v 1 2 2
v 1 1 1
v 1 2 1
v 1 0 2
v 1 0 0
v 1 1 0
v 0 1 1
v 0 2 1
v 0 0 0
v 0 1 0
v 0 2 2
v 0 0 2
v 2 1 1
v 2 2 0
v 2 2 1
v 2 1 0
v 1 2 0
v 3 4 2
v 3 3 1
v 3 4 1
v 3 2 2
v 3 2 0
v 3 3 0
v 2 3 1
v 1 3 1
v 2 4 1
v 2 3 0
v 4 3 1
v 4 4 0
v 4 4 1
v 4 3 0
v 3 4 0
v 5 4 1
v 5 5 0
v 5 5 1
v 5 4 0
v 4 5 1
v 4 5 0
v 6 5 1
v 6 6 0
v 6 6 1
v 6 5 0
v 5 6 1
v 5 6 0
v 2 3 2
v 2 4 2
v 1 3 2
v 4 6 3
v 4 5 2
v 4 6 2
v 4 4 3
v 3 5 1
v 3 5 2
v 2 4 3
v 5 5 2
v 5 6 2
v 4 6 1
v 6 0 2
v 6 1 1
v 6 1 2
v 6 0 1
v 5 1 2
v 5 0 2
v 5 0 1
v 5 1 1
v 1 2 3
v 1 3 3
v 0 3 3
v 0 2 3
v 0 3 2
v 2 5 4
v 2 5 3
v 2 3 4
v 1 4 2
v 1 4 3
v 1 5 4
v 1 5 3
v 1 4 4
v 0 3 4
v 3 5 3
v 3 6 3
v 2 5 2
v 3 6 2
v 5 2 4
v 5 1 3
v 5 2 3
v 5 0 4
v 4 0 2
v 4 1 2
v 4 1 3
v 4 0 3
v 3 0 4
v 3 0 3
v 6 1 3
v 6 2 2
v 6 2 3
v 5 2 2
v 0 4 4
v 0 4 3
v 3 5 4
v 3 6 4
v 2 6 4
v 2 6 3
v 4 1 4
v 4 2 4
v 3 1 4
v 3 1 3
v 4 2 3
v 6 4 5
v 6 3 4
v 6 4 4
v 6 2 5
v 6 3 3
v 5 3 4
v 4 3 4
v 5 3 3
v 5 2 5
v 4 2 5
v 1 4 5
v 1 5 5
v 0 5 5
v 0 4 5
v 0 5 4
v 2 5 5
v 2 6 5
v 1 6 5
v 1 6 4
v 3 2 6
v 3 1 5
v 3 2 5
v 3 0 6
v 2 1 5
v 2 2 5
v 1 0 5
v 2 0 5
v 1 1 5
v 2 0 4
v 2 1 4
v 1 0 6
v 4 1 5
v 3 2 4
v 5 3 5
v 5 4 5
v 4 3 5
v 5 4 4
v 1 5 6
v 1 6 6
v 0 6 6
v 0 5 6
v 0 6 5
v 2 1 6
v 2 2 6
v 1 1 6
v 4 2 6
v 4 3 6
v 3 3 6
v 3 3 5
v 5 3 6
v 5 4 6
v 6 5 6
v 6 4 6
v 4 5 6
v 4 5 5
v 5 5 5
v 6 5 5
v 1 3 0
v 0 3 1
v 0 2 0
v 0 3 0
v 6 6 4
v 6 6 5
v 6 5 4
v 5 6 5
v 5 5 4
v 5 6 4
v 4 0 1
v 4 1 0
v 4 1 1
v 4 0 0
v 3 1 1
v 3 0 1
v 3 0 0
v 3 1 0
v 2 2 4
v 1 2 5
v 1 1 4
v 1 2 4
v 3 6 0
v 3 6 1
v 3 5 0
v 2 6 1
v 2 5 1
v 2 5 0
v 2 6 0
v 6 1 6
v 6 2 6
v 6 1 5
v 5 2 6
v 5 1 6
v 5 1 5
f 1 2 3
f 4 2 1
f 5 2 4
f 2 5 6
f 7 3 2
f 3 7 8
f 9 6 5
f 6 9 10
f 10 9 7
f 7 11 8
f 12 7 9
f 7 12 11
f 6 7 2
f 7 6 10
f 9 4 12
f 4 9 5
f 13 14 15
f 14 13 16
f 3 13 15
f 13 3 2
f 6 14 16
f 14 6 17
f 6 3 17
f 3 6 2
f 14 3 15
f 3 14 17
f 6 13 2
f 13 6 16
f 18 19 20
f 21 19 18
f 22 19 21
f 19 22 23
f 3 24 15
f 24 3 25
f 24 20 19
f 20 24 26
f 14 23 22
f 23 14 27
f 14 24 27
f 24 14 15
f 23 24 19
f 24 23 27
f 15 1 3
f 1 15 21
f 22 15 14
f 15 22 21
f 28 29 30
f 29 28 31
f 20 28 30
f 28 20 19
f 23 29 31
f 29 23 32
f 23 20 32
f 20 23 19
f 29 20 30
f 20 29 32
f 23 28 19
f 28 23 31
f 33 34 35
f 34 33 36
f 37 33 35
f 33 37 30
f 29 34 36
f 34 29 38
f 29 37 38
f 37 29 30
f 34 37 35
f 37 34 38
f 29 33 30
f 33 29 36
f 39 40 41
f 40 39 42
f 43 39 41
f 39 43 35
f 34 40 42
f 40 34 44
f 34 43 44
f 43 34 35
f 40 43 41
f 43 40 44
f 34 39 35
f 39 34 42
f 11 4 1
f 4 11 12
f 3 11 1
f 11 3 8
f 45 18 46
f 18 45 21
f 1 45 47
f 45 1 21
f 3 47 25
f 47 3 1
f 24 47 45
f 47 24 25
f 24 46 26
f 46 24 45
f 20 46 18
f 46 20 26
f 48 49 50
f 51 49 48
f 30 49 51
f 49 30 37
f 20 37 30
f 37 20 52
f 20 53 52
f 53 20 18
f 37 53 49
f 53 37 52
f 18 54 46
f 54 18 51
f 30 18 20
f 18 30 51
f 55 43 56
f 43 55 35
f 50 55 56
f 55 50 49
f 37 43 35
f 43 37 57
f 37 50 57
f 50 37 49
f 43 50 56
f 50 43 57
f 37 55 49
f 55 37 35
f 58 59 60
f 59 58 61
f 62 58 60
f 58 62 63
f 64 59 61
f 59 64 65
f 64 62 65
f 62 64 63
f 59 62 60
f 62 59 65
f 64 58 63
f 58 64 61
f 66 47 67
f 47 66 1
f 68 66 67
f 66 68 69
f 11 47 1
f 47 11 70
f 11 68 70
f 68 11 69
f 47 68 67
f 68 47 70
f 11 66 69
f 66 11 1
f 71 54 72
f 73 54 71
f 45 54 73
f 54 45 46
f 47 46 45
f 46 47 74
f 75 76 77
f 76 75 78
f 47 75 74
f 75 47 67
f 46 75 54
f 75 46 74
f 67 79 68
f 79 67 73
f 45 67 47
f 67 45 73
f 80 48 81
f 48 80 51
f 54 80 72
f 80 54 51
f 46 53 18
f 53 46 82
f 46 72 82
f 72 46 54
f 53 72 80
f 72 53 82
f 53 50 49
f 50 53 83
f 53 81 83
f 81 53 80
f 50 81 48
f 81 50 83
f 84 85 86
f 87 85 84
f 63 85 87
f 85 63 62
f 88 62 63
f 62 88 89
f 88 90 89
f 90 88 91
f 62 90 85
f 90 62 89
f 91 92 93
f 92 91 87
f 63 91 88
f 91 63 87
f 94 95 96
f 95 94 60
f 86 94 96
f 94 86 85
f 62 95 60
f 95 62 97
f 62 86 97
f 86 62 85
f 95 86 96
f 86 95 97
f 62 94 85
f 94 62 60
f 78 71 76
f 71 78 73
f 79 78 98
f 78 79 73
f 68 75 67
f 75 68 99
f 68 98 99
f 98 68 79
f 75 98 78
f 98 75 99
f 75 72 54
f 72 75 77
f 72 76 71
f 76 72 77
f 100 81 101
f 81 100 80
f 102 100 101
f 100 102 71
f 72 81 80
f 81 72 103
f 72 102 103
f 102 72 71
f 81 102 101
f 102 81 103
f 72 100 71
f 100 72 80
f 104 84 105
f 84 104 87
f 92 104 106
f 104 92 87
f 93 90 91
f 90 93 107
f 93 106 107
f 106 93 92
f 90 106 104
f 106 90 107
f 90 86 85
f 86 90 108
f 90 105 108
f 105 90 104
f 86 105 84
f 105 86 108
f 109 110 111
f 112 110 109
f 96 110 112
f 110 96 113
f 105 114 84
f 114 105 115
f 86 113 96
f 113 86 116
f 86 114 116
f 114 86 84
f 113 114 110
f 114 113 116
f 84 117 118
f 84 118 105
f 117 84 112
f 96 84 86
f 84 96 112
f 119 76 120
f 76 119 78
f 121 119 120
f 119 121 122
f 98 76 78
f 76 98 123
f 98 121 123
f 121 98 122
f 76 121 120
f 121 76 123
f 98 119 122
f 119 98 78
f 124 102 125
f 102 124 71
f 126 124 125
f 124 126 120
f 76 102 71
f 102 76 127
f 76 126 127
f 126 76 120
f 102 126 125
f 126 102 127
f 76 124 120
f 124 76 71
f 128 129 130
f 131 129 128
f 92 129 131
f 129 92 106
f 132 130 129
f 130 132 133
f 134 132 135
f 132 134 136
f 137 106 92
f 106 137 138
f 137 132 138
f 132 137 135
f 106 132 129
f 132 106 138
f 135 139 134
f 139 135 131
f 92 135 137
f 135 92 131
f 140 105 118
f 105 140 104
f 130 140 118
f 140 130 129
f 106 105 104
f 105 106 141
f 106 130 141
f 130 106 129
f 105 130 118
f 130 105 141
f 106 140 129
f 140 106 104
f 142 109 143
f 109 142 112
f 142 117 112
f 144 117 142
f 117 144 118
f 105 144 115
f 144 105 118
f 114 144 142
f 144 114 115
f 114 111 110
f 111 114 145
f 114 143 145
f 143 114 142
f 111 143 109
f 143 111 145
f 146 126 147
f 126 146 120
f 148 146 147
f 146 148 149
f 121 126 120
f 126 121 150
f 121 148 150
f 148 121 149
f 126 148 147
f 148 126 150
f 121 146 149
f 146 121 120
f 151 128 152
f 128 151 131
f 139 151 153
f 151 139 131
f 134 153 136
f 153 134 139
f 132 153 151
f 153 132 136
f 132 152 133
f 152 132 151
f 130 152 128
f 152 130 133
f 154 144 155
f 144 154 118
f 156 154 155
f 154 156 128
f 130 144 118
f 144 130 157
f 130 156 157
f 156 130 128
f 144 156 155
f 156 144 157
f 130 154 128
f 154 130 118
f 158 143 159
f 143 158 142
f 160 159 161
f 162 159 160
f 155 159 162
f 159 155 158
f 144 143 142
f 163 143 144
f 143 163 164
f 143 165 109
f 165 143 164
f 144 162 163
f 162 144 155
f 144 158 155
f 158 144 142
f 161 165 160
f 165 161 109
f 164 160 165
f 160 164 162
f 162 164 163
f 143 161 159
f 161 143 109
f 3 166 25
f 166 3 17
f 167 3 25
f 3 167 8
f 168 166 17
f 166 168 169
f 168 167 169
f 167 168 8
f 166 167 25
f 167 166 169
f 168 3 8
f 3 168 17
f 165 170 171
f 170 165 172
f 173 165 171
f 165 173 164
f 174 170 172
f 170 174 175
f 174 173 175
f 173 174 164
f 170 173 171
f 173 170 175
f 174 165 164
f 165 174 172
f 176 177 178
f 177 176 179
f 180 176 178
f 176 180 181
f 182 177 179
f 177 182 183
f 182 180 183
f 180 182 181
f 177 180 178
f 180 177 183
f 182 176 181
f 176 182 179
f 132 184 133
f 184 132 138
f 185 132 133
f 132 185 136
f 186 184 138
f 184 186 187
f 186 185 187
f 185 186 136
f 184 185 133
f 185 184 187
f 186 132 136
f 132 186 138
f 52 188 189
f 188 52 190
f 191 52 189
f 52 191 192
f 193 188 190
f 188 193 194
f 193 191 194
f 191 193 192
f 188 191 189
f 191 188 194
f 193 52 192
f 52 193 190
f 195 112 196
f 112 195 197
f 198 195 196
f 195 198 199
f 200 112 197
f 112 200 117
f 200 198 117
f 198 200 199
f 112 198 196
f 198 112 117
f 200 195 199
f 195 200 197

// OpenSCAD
union() {
    translate([0, 0, 0]) cube([1, 1, 1]);
    translate([1, 1, 0]) cube([1, 1, 1]);
    translate([2, 2, 0]) cube([1, 1, 1]);
    translate([3, 3, 0]) cube([1, 1, 1]);
    translate([4, 4, 0]) cube([1, 1, 1]);
    translate([5, 5, 0]) cube([1, 1, 1]);
    translate([0, 1, 1]) cube([1, 1, 1]);
    translate([1, 2, 1]) cube([1, 1, 1]);
    translate([2, 3, 1]) cube([1, 1, 1]);
    translate([3, 4, 1]) cube([1, 1, 1]);
    translate([4, 5, 1]) cube([1, 1, 1]);
    translate([5, 0, 1]) cube([1, 1, 1]);
    translate([0, 2, 2]) cube([1, 1, 1]);
    translate([1, 3, 2]) cube([1, 1, 1]);
    translate([2, 4, 2]) cube([1, 1, 1]);
    translate([3, 5, 2]) cube([1, 1, 1]);
    translate([4, 0, 2]) cube([1, 1, 1]);
    translate([5, 1, 2]) cube([1, 1, 1]);
    translate([0, 3, 3]) cube([1, 1, 1]);
    translate([1, 4, 3]) cube([1, 1, 1]);
    translate([2, 5, 3]) cube([1, 1, 1]);
    translate([3, 0, 3]) cube([1, 1, 1]);
    translate([4, 1, 3]) cube([1, 1, 1]);
    translate([5, 2, 3]) cube([1, 1, 1]);
    translate([0, 4, 4]) cube([1, 1, 1]);
    translate([1, 5, 4]) cube([1, 1, 1]);
    translate([2, 0, 4]) cube([1, 1, 1]);
    translate([3, 1, 4]) cube([1, 1, 1]);
    translate([4, 2, 4]) cube([1, 1, 1]);
    translate([5, 3, 4]) cube([1, 1, 1]);
    translate([0, 5, 5]) cube([1, 1, 1]);
    translate([1, 0, 5]) cube([1, 1, 1]);
    translate([2, 1, 5]) cube([1, 1, 1]);
    translate([3, 2, 5]) cube([1, 1, 1]);
    translate([4, 3, 5]) cube([1, 1, 1]);
    translate([5, 4, 5]) cube([1, 1, 1]);
    translate([0, 0, 1]) cube([1, 1, 1]);
    translate([0, 2, 0]) cube([1, 1, 1]);
    translate([5, 5, 4]) cube([1, 1, 1]);
    translate([3, 0, 0]) cube([1, 1, 1]);
    translate([2, 2, 1]) cube([1, 1, 1]);
    translate([4, 4, 5]) cube([1, 1, 1]);
    translate([1, 1, 4]) cube([1, 1, 1]);
    translate([4, 0, 3]) cube([1, 1, 1]);
    translate([2, 5, 0]) cube([1, 1, 1]);
    translate([5, 1, 5]) cube([1, 1, 1]);
    translate([1, 3, 3]) cube([1, 1, 1]);
    translate([3, 4, 2]) cube([1, 1, 1]);
    translate([2, 0, 5]) cube([1, 1, 1]);
    translate([5, 2, 4]) cube([1, 1, 1]);
}
